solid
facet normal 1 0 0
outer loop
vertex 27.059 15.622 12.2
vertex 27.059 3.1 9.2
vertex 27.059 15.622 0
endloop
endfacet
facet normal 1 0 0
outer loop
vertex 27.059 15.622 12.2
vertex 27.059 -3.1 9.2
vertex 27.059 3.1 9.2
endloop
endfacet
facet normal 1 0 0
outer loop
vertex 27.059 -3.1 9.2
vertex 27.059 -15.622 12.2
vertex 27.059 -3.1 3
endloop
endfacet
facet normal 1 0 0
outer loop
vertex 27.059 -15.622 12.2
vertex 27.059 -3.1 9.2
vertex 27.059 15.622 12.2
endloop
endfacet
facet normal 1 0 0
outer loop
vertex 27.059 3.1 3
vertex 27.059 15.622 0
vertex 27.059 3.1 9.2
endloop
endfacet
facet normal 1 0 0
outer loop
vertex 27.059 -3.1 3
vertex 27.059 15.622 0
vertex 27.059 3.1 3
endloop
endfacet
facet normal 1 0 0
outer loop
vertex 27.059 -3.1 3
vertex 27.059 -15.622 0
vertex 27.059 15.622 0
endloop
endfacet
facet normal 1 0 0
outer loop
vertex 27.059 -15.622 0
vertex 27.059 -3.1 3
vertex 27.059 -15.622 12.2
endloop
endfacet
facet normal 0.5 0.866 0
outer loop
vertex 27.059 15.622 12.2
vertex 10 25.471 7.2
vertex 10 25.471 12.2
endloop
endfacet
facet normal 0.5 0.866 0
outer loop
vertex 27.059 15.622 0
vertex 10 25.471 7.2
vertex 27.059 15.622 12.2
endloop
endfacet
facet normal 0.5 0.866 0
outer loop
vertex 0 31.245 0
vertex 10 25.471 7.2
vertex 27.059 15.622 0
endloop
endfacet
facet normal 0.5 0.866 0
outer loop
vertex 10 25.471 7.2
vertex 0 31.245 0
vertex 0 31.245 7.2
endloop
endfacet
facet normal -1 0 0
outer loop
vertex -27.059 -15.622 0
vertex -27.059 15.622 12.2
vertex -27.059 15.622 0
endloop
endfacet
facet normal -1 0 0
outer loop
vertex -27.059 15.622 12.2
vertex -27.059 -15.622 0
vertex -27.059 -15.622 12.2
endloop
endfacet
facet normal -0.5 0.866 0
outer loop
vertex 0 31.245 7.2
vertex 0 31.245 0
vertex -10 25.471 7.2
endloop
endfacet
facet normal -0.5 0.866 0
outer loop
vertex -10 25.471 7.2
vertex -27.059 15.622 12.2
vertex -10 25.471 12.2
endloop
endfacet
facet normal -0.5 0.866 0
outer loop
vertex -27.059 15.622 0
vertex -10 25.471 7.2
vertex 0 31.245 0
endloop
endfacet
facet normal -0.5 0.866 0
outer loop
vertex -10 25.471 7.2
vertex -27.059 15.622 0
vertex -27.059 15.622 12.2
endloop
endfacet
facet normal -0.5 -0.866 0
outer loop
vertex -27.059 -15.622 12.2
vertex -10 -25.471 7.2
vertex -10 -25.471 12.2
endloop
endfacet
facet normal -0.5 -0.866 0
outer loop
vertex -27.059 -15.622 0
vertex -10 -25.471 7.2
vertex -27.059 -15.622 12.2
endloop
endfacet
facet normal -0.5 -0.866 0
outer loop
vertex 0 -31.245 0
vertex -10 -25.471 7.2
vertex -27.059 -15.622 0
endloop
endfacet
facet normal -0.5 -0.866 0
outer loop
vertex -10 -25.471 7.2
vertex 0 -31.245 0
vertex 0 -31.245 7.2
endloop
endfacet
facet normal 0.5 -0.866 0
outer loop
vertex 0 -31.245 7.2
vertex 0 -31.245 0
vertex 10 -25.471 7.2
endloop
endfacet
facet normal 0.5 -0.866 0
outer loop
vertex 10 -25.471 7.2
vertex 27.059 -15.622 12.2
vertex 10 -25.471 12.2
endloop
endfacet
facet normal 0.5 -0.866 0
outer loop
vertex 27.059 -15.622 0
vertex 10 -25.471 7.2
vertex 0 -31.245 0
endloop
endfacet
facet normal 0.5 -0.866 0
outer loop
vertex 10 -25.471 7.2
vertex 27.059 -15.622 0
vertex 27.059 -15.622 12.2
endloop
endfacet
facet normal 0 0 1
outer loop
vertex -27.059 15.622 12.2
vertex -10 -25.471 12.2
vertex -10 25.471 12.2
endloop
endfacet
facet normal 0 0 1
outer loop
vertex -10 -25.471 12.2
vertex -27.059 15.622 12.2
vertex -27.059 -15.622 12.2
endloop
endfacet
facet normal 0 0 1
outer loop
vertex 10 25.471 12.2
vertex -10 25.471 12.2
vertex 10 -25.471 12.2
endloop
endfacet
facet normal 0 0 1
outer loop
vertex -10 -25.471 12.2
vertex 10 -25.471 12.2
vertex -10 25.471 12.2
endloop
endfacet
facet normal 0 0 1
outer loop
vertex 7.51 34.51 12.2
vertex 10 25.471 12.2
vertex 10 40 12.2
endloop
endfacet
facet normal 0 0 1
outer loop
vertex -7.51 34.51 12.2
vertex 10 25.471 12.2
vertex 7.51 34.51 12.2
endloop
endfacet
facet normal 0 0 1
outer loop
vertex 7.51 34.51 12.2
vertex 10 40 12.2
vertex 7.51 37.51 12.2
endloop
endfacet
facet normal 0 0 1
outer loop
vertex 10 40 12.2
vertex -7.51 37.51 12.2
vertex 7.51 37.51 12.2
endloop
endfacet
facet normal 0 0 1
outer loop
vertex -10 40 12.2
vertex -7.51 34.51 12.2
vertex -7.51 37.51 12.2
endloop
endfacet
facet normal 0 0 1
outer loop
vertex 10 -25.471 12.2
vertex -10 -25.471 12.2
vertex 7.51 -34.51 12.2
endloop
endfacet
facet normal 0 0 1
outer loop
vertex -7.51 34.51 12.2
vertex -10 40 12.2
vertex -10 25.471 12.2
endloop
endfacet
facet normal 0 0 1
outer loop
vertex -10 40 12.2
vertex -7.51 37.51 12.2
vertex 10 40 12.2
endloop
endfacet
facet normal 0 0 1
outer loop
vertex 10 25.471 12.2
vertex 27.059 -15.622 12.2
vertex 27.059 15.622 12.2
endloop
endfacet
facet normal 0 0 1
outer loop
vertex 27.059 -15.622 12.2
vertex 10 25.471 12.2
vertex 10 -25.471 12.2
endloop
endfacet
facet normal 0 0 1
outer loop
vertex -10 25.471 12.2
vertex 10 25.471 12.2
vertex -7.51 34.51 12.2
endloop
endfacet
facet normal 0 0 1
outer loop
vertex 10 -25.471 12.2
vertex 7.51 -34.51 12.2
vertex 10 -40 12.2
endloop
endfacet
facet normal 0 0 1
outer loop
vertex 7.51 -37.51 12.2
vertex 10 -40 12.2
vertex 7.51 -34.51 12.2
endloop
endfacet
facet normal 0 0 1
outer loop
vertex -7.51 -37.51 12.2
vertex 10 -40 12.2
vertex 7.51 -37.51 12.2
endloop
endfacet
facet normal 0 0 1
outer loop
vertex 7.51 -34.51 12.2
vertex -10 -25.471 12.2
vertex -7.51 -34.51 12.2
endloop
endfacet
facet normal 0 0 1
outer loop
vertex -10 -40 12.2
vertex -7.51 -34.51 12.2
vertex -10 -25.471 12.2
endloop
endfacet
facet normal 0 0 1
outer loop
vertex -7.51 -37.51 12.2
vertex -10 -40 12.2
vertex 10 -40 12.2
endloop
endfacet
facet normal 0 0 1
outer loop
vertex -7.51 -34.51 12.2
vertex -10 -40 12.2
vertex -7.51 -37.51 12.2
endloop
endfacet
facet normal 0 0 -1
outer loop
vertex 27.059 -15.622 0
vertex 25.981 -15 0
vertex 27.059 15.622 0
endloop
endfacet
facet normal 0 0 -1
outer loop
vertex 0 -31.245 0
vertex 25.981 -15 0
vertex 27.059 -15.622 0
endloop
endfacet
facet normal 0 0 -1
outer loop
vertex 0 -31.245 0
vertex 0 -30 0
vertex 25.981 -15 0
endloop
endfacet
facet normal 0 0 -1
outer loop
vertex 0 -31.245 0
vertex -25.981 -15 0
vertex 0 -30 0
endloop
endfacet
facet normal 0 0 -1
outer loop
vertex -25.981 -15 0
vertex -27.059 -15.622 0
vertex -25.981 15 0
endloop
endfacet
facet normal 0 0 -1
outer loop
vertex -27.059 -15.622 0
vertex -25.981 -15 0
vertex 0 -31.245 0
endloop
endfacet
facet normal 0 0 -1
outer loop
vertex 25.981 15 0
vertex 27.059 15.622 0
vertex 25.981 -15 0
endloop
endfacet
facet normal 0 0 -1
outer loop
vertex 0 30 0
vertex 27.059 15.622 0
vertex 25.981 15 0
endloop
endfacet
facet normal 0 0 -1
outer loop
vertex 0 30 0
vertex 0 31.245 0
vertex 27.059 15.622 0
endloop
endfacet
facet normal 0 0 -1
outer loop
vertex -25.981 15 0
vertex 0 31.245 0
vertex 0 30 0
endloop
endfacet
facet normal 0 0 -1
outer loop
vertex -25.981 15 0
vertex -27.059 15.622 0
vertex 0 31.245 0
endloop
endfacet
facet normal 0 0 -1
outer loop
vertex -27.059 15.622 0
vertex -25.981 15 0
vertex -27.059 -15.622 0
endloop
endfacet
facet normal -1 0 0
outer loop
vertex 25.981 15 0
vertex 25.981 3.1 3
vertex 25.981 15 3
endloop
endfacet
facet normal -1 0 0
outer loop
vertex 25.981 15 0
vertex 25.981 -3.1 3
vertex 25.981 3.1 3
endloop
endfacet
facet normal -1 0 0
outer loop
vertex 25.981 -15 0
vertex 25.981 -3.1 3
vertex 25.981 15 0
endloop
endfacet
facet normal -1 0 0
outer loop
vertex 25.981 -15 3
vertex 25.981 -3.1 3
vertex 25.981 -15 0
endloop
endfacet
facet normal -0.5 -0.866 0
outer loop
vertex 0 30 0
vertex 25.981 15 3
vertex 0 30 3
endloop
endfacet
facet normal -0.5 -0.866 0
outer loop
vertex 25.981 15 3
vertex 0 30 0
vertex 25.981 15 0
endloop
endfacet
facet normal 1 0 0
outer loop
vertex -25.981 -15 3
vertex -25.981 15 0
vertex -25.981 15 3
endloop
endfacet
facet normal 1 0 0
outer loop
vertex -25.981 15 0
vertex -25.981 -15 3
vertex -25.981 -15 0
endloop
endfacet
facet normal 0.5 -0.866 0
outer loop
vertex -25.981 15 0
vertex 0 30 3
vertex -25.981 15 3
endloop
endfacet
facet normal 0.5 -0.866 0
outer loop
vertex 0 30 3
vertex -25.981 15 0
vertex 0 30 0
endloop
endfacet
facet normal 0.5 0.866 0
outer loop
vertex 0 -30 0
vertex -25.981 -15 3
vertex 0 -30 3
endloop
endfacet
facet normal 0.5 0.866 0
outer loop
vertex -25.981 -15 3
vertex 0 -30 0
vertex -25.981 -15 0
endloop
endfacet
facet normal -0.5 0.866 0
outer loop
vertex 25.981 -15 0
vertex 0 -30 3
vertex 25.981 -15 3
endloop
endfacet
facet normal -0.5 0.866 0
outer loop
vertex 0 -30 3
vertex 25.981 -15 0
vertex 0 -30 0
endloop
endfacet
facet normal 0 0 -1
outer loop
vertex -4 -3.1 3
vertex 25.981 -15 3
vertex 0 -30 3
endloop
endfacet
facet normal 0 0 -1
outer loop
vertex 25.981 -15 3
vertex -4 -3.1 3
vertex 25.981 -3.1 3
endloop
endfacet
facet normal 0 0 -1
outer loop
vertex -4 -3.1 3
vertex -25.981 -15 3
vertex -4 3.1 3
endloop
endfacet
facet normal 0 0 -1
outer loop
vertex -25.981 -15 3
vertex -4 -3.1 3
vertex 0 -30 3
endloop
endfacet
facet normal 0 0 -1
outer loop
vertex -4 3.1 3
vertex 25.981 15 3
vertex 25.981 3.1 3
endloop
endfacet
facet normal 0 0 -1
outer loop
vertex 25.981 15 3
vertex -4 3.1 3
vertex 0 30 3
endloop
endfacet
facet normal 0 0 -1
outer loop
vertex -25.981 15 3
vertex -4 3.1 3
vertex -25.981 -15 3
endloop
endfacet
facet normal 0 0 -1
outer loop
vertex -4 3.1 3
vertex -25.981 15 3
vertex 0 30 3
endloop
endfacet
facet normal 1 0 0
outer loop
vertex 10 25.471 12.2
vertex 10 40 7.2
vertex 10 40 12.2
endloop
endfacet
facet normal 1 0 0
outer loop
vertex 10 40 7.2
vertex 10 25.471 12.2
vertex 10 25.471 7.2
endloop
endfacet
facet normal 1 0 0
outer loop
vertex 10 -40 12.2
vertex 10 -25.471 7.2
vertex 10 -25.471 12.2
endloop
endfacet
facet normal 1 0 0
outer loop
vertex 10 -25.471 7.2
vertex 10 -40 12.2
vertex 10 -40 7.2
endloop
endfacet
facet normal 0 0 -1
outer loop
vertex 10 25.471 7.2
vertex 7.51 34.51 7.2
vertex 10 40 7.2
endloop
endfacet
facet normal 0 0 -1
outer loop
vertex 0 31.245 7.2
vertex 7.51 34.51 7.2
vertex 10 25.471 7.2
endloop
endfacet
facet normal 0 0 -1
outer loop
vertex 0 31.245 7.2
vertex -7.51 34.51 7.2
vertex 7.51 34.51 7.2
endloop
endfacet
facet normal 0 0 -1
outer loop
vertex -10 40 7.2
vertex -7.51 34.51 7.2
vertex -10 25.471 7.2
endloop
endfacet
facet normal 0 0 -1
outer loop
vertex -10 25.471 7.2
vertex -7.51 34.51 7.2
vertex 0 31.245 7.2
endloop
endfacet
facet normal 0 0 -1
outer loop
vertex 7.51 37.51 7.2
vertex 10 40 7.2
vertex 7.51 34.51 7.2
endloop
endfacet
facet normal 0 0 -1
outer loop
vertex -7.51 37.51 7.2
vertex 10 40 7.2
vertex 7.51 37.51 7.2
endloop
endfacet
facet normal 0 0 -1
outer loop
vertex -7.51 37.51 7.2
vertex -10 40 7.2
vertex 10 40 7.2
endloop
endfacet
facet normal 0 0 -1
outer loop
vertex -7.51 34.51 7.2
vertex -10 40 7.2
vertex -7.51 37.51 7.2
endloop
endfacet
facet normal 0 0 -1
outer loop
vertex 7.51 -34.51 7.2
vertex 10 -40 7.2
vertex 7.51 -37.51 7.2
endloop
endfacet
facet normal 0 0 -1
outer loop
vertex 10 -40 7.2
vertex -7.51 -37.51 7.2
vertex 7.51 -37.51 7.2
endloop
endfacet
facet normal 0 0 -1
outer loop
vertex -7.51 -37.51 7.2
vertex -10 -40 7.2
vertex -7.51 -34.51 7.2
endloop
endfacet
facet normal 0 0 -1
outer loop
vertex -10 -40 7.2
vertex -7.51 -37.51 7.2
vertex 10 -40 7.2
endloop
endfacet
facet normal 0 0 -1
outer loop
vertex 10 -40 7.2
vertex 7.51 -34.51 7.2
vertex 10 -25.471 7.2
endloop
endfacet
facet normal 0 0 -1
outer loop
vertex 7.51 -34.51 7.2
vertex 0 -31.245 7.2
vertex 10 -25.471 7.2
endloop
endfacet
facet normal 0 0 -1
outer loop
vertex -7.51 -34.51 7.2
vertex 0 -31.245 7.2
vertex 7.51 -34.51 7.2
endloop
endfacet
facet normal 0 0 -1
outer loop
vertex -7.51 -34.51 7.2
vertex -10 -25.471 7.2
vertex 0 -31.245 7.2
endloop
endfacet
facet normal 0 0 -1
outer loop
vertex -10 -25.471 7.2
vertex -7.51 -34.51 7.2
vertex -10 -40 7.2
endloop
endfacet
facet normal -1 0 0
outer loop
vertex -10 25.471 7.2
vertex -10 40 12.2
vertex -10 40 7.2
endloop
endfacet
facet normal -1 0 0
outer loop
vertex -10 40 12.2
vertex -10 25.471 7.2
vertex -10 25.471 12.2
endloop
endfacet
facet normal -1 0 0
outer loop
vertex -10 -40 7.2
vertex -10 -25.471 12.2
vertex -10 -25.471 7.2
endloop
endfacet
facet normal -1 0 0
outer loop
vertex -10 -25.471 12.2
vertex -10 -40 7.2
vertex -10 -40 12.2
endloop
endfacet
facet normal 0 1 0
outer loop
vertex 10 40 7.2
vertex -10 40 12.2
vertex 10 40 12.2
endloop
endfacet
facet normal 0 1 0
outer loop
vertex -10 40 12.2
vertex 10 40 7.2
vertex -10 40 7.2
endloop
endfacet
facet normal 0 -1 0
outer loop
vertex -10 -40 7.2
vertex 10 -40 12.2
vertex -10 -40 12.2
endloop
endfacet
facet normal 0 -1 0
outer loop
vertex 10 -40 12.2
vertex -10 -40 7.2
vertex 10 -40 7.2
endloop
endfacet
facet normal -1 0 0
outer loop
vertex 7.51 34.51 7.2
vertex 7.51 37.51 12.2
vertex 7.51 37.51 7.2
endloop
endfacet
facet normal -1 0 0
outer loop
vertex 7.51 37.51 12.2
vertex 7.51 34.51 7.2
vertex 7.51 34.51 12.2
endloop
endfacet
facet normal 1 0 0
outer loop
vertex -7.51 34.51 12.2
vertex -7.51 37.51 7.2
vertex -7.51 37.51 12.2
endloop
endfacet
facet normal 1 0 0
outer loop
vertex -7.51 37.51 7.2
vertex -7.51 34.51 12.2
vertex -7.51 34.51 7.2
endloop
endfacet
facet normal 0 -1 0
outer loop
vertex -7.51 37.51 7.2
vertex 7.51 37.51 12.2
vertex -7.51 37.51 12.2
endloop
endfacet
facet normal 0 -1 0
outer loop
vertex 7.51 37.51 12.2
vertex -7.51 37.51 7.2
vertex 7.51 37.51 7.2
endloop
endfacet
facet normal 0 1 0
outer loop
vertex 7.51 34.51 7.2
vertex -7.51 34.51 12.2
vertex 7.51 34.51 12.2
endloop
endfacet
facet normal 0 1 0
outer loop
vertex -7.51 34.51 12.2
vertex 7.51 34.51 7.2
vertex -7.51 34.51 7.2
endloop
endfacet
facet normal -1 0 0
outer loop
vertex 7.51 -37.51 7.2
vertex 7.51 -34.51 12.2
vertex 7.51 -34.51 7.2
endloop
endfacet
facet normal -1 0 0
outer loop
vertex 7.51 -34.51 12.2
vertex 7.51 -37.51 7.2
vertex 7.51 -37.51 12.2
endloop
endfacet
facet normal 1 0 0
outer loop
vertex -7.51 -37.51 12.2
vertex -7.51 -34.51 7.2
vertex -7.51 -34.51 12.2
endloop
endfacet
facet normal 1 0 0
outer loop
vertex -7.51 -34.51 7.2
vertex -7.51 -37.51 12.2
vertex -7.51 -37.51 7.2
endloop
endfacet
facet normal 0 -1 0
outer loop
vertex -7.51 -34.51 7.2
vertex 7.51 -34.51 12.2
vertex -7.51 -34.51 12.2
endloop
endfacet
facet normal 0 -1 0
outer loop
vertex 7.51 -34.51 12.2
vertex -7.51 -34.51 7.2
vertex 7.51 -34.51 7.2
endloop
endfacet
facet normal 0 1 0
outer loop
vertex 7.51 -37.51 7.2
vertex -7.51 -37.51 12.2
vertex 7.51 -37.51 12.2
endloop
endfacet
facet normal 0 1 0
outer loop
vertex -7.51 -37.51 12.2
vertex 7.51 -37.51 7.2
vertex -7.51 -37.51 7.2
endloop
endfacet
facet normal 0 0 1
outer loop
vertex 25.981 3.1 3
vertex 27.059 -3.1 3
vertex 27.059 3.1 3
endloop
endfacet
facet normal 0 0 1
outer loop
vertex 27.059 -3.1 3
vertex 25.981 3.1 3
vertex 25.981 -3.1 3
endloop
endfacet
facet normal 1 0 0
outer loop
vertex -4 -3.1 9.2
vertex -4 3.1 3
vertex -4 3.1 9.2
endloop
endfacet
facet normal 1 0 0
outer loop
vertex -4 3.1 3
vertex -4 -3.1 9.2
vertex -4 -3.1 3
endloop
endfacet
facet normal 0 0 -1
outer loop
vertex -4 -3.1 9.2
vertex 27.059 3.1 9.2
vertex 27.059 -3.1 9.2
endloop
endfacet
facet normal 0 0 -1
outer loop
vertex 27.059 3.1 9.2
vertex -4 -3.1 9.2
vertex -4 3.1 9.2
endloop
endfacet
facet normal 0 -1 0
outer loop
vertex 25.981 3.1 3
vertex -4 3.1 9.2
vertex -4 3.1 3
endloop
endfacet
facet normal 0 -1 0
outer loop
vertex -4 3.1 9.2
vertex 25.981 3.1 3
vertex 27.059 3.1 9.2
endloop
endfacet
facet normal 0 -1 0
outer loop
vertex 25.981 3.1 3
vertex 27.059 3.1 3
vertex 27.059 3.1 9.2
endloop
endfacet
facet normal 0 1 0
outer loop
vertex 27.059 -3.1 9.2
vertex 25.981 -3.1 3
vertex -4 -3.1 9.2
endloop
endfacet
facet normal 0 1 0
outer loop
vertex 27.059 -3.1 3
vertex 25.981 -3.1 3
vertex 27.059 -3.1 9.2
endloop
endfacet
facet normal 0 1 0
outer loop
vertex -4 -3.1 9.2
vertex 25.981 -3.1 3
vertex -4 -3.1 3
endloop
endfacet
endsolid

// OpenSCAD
/*
 * Sonoff SNZB-02LD holder
 *
 * Author: Pavel Rampas
 * Version: 1.0.0 (Changelog is at the bottom)
 * License: CC BY-SA 4.0 [https://creativecommons.org/licenses/by-sa/4.0/]
 * Link: https://github.com/pavelrampas/openscad-models
 *
 * OpenSCAD version: 2021.01
 *
 * Instructions:
 * Set up parameters, render and print.
 *
 * Height is layer.
 * Thickness is perimeter.
 */

// Parameters
//------------------------------------------------------------------------------

$fn = $preview ? 15 : 90;

// Parameters that don't need to be changed
//------------------------------------------------------------------------------

thickness = 2.49;

height = 3;

boltHeight = 3 ;
boldDiamater = 60;

probeD = 6.2;
probeLength = 32;

holderHeight = 5;
holderLength = 10;
holderWidth = 20;
holderHole = 3;

// Code
//------------------------------------------------------------------------------

difference() {
    union() {
        // Holder
        difference() {
            translate([
                -(holderWidth / 2),
                -((boldDiamater + (holderLength * 2)) / 2),
                (boltHeight + probeD + height) - holderHeight
            ]) {
                cube([
                    holderWidth,
                    boldDiamater + (holderLength * 2),
                    holderHeight
                ]);
            }

            _holderHole(((boldDiamater + (holderLength * 2)) / 2)
                - holderHole - thickness);
            _holderHole(-(((boldDiamater + (holderLength * 2)) / 2)
                - thickness));

            _base();
        }

        _base();
    }

    // Probe hole
    translate([-4, -(probeD / 2), boltHeight + probeD]) {
        rotate([0, 90, 0]) {
            #cube([probeD, probeD, probeLength]);
        }
    }
}

// Functions
//------------------------------------------------------------------------------

// Modules
//------------------------------------------------------------------------------

// Base
module _base() {
    rotate([0, 0, 90]) {
        difference() {
            // Base
            cylinder(
                h = boltHeight + probeD + height,
                d = boldDiamater + thickness,
                $fn = 6
            );

            // Bolt
            cylinder(h = boltHeight, d = boldDiamater, $fn = 6);
        }
    }
}

// Holder hole
module _holderHole(side) {
    translate([-((holderWidth - (2 * thickness)) / 2), side, 0]) {
        cube([
            holderWidth - (2 * thickness),
            holderHole,
            boltHeight + probeD + height
        ]);
    }
}

// Changelog
//------------------------------------------------------------------------------

// [1.0.0]:
// Initial release.
